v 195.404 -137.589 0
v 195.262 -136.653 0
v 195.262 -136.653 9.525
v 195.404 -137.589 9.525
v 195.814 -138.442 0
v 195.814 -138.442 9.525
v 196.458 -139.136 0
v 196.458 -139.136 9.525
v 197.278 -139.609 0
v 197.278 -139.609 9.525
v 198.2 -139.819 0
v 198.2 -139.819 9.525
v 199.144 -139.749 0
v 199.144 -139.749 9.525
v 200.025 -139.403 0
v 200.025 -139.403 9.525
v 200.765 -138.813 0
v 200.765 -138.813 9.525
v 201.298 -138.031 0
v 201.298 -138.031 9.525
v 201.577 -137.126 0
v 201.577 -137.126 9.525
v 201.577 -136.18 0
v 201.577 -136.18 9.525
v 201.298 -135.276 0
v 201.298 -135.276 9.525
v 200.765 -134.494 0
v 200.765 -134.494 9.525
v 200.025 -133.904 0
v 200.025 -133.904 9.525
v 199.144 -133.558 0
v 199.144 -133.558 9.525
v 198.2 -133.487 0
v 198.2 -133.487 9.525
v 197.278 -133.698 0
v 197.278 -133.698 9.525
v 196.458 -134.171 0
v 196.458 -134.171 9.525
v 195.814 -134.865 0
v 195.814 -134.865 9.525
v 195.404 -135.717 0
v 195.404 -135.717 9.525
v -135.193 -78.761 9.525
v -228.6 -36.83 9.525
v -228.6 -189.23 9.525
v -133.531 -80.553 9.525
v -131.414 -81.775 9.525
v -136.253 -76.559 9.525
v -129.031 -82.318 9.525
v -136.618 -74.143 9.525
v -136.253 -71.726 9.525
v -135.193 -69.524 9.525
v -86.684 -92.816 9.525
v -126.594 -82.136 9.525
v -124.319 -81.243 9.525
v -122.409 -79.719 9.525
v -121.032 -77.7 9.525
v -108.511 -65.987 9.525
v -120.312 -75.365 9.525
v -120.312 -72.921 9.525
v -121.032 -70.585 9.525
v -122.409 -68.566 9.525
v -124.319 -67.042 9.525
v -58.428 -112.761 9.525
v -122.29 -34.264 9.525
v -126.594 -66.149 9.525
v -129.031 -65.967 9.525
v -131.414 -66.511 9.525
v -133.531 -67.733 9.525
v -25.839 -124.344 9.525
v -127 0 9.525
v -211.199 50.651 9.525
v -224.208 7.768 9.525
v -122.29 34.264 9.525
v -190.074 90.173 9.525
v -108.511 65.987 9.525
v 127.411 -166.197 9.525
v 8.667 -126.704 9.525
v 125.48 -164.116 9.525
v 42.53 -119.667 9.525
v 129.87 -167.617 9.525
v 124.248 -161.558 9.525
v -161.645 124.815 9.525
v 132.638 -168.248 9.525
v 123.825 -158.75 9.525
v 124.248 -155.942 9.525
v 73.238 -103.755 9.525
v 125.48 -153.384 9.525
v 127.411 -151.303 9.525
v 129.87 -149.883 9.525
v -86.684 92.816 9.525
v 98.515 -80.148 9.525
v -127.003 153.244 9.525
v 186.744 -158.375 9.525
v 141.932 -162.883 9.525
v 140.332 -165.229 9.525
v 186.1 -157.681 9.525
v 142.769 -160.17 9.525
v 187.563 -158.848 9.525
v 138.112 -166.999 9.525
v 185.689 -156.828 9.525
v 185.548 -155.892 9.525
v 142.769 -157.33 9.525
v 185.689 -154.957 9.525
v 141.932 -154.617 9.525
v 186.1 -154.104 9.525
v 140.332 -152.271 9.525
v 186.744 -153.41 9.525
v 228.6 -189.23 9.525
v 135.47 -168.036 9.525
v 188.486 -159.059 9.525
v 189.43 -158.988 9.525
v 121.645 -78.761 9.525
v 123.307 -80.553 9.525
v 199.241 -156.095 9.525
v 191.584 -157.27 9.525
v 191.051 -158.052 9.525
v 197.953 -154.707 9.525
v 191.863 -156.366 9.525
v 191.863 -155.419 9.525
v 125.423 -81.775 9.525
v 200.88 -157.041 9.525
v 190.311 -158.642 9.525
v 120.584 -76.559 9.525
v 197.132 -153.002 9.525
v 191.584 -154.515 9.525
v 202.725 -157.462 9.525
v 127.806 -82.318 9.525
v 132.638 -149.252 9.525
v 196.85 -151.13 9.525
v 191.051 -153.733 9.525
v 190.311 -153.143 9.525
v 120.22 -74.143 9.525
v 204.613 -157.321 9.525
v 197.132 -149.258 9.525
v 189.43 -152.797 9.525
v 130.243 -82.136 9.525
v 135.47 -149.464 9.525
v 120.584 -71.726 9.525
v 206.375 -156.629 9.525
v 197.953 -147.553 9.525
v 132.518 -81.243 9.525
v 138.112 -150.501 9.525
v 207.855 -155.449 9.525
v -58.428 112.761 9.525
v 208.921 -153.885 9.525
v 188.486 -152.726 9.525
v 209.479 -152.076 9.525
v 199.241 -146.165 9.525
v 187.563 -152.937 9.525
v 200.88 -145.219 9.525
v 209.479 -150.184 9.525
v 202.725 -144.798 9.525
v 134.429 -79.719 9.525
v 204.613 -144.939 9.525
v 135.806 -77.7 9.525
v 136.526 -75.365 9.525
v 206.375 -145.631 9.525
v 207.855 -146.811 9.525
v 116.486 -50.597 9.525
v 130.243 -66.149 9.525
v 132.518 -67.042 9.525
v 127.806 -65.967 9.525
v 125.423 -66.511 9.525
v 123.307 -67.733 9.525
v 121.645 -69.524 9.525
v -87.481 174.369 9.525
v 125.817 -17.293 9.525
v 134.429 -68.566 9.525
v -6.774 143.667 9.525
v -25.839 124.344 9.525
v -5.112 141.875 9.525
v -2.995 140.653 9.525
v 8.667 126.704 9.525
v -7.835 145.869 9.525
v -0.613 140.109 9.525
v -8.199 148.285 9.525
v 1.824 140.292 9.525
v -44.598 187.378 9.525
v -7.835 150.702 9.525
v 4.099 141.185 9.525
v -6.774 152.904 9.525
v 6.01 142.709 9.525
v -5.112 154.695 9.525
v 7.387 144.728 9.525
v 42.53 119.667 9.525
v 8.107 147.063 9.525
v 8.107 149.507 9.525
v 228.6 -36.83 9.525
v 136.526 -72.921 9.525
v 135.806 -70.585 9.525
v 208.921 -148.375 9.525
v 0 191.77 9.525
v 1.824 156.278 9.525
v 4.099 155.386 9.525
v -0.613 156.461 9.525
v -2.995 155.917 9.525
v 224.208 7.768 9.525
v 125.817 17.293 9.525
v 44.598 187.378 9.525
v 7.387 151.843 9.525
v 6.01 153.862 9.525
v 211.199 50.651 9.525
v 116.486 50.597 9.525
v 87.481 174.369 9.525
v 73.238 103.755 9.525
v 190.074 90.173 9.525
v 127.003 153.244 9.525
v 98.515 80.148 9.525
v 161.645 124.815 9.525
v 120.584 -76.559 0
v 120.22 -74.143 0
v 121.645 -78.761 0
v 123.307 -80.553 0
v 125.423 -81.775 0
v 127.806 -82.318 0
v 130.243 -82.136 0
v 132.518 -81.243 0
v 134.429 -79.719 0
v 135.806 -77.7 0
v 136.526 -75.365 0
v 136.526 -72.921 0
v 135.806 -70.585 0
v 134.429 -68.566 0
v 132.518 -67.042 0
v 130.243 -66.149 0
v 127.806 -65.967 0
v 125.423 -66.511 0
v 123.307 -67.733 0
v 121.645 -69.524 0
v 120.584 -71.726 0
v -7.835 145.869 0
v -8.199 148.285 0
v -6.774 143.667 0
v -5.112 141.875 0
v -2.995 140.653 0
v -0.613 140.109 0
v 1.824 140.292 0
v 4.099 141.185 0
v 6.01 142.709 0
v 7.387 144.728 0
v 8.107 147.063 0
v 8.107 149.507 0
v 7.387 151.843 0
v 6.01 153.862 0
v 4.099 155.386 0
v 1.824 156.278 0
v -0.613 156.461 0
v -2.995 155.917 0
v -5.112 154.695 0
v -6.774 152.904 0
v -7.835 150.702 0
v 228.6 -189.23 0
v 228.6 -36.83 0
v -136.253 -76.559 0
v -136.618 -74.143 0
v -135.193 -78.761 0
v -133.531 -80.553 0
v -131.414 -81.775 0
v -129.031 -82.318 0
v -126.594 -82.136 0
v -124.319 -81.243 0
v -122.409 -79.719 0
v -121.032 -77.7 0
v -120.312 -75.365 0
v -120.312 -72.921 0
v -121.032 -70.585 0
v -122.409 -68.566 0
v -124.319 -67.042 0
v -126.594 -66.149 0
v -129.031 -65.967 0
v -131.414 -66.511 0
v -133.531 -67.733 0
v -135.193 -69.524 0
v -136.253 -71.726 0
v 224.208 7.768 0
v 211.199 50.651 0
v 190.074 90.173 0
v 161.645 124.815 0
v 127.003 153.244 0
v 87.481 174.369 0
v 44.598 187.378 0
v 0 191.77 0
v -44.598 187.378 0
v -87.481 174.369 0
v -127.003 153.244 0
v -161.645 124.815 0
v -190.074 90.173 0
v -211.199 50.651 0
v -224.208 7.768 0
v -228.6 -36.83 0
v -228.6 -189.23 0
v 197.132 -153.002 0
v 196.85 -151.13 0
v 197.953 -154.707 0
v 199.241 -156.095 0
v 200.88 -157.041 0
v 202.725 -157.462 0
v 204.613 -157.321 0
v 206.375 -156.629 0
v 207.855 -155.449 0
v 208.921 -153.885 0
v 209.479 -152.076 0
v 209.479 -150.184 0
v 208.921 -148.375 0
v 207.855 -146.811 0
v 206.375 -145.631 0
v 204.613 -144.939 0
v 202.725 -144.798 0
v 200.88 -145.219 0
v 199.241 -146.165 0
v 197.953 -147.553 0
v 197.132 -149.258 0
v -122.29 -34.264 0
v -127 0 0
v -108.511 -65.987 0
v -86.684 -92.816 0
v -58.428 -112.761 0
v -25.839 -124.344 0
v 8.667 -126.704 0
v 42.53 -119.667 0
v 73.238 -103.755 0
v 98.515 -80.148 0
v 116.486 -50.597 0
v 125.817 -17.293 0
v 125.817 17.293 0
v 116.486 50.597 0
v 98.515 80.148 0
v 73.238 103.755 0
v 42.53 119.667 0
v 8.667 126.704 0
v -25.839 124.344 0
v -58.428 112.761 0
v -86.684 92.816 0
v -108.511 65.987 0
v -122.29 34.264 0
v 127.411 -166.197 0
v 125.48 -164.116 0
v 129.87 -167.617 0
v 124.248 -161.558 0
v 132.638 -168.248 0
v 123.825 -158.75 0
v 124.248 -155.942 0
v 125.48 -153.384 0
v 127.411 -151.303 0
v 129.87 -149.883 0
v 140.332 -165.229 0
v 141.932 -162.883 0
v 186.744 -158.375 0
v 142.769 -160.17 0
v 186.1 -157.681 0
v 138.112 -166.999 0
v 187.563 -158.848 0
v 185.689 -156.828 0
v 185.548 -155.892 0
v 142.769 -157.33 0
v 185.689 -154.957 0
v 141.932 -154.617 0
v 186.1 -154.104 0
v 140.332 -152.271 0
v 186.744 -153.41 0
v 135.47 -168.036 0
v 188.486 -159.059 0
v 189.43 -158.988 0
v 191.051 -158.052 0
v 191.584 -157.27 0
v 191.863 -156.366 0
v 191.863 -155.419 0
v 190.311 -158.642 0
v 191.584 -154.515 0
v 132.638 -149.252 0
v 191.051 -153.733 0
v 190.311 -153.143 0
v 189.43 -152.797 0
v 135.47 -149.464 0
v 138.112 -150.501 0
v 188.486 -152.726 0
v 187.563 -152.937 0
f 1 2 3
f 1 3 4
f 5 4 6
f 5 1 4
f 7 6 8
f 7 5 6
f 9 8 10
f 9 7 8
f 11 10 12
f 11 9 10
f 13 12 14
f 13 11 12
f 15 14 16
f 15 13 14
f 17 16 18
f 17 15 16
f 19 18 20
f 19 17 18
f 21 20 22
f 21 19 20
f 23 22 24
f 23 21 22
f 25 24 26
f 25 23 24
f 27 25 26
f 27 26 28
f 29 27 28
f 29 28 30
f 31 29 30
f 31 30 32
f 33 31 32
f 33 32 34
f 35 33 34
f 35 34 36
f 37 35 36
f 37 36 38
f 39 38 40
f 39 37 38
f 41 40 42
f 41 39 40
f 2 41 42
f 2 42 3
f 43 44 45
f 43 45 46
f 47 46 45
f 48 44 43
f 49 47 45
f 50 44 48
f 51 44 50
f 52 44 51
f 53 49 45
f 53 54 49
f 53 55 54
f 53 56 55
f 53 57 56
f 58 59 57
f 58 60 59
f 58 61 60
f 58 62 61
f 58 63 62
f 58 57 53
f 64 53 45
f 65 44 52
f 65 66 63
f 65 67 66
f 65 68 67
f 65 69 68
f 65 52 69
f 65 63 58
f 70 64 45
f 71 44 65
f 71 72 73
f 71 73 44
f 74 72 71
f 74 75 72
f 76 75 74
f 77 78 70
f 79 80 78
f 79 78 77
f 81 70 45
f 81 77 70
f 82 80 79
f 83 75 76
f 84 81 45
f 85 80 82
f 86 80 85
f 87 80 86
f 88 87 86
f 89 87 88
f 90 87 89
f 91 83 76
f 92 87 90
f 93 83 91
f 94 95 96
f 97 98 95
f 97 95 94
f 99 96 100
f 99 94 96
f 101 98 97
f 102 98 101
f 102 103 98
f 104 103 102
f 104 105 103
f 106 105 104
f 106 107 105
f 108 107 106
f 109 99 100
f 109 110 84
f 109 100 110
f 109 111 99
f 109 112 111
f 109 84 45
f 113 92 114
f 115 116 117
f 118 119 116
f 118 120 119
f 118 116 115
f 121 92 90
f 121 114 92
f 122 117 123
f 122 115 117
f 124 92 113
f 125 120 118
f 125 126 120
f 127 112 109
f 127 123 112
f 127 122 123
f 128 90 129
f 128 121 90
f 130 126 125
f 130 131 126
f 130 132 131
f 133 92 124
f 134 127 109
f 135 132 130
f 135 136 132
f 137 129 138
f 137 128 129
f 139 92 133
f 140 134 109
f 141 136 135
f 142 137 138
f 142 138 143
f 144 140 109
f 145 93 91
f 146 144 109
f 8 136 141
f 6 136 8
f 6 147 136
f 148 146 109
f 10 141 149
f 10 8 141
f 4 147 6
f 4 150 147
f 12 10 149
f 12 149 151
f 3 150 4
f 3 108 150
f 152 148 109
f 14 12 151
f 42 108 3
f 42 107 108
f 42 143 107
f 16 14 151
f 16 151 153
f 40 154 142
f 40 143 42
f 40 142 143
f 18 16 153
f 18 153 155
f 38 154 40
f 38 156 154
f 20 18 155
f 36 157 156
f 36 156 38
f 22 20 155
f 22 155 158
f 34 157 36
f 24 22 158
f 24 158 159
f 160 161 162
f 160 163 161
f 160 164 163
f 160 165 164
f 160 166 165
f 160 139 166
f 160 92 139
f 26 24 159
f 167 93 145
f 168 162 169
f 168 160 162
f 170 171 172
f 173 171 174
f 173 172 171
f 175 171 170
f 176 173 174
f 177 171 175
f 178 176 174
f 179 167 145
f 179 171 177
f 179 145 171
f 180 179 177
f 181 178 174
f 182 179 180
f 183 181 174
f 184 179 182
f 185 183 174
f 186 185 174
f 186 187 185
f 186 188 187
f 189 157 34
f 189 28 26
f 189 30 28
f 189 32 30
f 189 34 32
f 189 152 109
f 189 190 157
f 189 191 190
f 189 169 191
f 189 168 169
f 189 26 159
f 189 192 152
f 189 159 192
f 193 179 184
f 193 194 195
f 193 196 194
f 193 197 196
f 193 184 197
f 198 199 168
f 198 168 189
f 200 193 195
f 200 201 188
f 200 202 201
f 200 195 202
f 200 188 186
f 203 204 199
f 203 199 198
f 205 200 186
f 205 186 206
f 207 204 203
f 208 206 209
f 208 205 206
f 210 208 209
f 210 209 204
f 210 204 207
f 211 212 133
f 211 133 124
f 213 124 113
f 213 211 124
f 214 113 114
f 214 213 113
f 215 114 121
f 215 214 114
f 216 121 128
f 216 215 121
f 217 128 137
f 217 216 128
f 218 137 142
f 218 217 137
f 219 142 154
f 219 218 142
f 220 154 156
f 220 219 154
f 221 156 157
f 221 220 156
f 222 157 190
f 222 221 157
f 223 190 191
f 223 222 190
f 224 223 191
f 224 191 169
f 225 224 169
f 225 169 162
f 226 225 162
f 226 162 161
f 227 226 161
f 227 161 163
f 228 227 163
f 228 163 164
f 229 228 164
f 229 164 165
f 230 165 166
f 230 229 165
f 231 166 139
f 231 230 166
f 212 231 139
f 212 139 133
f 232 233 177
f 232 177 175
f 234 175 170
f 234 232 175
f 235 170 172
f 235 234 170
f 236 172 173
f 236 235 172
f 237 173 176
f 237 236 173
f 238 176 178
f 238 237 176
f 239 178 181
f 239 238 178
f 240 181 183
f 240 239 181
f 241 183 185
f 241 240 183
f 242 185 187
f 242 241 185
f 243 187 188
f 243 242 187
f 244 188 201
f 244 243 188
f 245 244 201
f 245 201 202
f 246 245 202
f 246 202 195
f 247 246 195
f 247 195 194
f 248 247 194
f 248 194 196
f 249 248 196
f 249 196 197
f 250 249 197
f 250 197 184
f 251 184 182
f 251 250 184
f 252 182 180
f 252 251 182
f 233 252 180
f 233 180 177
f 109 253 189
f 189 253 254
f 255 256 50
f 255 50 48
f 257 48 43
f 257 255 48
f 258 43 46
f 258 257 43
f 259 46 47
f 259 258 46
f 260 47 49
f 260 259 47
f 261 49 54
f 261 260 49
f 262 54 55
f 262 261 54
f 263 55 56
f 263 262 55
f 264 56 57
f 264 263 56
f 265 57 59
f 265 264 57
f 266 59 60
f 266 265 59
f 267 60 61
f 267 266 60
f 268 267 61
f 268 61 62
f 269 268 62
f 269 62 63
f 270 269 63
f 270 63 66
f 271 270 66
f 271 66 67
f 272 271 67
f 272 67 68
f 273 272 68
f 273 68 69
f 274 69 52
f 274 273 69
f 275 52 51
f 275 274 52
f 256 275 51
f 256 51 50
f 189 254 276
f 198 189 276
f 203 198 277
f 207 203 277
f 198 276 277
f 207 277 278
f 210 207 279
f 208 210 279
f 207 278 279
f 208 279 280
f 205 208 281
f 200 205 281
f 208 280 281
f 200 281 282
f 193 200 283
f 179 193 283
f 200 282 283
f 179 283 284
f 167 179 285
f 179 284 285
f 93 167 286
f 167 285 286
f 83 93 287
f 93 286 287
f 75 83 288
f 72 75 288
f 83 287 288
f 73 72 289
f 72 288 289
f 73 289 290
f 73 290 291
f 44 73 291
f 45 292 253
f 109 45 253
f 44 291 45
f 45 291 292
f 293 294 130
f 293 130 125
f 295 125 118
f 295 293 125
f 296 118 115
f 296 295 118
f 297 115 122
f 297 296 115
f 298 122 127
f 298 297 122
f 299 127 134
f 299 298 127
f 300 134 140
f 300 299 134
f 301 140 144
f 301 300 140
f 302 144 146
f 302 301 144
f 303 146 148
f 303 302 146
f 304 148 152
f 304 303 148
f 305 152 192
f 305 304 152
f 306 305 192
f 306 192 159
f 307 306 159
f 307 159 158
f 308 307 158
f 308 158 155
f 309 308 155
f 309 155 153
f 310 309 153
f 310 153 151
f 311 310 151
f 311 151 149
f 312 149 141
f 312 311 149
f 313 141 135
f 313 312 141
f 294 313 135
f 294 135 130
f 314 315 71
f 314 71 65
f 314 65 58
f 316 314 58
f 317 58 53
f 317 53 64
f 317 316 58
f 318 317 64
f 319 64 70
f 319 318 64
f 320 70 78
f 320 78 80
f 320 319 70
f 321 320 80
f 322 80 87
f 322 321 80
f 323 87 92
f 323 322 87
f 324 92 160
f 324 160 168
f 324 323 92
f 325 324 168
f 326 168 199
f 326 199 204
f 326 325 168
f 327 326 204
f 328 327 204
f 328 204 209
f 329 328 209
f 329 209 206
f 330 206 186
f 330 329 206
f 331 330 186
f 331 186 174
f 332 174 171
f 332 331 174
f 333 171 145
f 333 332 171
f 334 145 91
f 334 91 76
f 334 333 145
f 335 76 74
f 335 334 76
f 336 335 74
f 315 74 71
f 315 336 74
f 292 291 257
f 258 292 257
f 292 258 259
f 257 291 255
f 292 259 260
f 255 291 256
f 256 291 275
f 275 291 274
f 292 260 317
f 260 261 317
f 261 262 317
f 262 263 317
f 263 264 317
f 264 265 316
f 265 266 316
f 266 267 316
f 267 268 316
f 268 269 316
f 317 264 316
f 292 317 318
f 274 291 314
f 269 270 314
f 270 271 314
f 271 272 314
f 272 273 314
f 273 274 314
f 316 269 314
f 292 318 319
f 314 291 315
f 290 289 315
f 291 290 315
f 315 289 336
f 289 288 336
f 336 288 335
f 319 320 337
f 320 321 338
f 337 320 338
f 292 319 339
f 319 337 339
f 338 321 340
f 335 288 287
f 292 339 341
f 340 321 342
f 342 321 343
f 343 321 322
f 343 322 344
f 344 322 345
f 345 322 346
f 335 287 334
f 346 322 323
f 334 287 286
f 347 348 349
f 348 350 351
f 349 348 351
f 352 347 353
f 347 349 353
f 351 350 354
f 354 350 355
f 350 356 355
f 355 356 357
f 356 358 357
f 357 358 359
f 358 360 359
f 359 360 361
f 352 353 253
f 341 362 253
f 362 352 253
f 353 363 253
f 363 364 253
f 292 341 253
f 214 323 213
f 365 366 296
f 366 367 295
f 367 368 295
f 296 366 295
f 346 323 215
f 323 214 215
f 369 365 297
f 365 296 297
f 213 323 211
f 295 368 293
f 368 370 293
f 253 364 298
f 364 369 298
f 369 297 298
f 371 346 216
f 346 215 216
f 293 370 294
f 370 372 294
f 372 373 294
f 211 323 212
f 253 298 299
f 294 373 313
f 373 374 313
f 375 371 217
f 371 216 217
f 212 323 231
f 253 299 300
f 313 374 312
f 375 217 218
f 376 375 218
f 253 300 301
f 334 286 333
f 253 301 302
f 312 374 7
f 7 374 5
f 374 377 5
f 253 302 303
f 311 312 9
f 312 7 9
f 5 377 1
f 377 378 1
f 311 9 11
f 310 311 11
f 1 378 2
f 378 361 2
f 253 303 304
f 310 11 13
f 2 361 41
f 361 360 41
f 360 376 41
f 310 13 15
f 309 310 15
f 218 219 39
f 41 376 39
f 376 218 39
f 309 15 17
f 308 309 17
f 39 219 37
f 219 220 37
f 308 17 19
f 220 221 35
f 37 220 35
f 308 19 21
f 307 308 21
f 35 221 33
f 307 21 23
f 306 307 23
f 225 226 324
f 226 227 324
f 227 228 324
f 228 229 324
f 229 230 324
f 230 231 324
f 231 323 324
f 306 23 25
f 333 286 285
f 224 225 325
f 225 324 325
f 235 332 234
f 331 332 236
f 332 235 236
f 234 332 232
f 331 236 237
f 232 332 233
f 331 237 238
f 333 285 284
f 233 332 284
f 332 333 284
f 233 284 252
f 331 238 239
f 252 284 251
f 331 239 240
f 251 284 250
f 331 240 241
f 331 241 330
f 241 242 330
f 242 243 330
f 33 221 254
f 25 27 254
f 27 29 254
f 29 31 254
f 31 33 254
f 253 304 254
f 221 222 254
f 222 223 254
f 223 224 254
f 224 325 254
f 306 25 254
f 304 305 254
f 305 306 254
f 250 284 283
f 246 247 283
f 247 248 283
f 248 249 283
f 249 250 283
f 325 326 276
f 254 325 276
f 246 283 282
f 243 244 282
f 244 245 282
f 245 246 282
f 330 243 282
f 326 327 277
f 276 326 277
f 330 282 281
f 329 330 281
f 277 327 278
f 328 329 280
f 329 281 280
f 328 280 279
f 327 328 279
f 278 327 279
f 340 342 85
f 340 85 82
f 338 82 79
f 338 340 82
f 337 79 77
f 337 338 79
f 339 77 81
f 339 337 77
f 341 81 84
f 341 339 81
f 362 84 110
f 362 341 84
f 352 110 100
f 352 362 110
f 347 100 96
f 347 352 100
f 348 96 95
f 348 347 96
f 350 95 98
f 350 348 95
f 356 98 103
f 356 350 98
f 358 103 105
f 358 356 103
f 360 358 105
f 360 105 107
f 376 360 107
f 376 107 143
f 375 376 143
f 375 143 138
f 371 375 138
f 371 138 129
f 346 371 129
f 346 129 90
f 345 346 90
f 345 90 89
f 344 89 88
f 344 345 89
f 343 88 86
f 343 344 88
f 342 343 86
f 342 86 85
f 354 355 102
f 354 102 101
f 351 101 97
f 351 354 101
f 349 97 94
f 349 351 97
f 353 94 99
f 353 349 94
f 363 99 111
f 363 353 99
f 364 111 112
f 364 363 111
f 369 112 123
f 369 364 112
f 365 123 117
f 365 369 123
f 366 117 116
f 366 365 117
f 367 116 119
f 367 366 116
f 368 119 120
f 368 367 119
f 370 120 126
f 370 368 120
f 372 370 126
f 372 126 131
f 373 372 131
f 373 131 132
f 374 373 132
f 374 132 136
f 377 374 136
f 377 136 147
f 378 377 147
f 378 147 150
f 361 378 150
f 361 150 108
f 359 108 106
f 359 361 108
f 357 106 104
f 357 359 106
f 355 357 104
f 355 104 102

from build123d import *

# Parameters (mm, degrees)
SKETCH1_R           = 127
SKETCH1_R_2         = 8.198770857
SKETCH1_R_3         = 6.35
SKETCH1_R_4         = 3.175
SKETCH1_R_5         = 9.525
BOSS_EXTRUDE1_DEPTH = 9.525


with BuildPart() as part:
    # Sketch1 → Boss-Extrude1 (new body)
    with BuildSketch(Plane.XY):
        with BuildLine():
            Line((-228.6, -36.83), (-228.6, -189.23))
            Line((-228.6, -189.23), (228.6, -189.23))
            Line((228.6, -189.23), (228.6, -36.83))
            ThreePointArc((228.6, -36.83), (0, 191.77), (-228.6, -36.83))
        make_face()
        with Locations(Location((0, 0, 0), (0, 0, 180))):
            Circle(SKETCH1_R, mode=Mode.SUBTRACT)
        with Locations(Location((0, 148.2852, 0), (0, 0, 180))):
            Circle(SKETCH1_R_2, mode=Mode.SUBTRACT)
        with Locations(Location((128.418750205, -74.1426, 0), (0, 0, 180))):
            Circle(SKETCH1_R_2, mode=Mode.SUBTRACT)
        with Locations(Location((-128.418750205, -74.1426, 0), (0, 0, 180))):
            Circle(SKETCH1_R_2, mode=Mode.SUBTRACT)
        with Locations(Location((203.2, -151.13, 0), (0, 0, 180))):
            Circle(SKETCH1_R_3, mode=Mode.SUBTRACT)
        with Locations(Location((188.723253344, -155.8925, 0), (0, 0, 180))):
            Circle(SKETCH1_R_4, mode=Mode.SUBTRACT)
        with Locations(Location((198.4375, -136.653253344, 0), (0, 0, 180))):
            Circle(SKETCH1_R_4, mode=Mode.SUBTRACT)
        with Locations(Location((133.35, -158.75, 0), (0, 0, 180))):
            Circle(SKETCH1_R_5, mode=Mode.SUBTRACT)
    extrude(amount=BOSS_EXTRUDE1_DEPTH)


solid = part.part
